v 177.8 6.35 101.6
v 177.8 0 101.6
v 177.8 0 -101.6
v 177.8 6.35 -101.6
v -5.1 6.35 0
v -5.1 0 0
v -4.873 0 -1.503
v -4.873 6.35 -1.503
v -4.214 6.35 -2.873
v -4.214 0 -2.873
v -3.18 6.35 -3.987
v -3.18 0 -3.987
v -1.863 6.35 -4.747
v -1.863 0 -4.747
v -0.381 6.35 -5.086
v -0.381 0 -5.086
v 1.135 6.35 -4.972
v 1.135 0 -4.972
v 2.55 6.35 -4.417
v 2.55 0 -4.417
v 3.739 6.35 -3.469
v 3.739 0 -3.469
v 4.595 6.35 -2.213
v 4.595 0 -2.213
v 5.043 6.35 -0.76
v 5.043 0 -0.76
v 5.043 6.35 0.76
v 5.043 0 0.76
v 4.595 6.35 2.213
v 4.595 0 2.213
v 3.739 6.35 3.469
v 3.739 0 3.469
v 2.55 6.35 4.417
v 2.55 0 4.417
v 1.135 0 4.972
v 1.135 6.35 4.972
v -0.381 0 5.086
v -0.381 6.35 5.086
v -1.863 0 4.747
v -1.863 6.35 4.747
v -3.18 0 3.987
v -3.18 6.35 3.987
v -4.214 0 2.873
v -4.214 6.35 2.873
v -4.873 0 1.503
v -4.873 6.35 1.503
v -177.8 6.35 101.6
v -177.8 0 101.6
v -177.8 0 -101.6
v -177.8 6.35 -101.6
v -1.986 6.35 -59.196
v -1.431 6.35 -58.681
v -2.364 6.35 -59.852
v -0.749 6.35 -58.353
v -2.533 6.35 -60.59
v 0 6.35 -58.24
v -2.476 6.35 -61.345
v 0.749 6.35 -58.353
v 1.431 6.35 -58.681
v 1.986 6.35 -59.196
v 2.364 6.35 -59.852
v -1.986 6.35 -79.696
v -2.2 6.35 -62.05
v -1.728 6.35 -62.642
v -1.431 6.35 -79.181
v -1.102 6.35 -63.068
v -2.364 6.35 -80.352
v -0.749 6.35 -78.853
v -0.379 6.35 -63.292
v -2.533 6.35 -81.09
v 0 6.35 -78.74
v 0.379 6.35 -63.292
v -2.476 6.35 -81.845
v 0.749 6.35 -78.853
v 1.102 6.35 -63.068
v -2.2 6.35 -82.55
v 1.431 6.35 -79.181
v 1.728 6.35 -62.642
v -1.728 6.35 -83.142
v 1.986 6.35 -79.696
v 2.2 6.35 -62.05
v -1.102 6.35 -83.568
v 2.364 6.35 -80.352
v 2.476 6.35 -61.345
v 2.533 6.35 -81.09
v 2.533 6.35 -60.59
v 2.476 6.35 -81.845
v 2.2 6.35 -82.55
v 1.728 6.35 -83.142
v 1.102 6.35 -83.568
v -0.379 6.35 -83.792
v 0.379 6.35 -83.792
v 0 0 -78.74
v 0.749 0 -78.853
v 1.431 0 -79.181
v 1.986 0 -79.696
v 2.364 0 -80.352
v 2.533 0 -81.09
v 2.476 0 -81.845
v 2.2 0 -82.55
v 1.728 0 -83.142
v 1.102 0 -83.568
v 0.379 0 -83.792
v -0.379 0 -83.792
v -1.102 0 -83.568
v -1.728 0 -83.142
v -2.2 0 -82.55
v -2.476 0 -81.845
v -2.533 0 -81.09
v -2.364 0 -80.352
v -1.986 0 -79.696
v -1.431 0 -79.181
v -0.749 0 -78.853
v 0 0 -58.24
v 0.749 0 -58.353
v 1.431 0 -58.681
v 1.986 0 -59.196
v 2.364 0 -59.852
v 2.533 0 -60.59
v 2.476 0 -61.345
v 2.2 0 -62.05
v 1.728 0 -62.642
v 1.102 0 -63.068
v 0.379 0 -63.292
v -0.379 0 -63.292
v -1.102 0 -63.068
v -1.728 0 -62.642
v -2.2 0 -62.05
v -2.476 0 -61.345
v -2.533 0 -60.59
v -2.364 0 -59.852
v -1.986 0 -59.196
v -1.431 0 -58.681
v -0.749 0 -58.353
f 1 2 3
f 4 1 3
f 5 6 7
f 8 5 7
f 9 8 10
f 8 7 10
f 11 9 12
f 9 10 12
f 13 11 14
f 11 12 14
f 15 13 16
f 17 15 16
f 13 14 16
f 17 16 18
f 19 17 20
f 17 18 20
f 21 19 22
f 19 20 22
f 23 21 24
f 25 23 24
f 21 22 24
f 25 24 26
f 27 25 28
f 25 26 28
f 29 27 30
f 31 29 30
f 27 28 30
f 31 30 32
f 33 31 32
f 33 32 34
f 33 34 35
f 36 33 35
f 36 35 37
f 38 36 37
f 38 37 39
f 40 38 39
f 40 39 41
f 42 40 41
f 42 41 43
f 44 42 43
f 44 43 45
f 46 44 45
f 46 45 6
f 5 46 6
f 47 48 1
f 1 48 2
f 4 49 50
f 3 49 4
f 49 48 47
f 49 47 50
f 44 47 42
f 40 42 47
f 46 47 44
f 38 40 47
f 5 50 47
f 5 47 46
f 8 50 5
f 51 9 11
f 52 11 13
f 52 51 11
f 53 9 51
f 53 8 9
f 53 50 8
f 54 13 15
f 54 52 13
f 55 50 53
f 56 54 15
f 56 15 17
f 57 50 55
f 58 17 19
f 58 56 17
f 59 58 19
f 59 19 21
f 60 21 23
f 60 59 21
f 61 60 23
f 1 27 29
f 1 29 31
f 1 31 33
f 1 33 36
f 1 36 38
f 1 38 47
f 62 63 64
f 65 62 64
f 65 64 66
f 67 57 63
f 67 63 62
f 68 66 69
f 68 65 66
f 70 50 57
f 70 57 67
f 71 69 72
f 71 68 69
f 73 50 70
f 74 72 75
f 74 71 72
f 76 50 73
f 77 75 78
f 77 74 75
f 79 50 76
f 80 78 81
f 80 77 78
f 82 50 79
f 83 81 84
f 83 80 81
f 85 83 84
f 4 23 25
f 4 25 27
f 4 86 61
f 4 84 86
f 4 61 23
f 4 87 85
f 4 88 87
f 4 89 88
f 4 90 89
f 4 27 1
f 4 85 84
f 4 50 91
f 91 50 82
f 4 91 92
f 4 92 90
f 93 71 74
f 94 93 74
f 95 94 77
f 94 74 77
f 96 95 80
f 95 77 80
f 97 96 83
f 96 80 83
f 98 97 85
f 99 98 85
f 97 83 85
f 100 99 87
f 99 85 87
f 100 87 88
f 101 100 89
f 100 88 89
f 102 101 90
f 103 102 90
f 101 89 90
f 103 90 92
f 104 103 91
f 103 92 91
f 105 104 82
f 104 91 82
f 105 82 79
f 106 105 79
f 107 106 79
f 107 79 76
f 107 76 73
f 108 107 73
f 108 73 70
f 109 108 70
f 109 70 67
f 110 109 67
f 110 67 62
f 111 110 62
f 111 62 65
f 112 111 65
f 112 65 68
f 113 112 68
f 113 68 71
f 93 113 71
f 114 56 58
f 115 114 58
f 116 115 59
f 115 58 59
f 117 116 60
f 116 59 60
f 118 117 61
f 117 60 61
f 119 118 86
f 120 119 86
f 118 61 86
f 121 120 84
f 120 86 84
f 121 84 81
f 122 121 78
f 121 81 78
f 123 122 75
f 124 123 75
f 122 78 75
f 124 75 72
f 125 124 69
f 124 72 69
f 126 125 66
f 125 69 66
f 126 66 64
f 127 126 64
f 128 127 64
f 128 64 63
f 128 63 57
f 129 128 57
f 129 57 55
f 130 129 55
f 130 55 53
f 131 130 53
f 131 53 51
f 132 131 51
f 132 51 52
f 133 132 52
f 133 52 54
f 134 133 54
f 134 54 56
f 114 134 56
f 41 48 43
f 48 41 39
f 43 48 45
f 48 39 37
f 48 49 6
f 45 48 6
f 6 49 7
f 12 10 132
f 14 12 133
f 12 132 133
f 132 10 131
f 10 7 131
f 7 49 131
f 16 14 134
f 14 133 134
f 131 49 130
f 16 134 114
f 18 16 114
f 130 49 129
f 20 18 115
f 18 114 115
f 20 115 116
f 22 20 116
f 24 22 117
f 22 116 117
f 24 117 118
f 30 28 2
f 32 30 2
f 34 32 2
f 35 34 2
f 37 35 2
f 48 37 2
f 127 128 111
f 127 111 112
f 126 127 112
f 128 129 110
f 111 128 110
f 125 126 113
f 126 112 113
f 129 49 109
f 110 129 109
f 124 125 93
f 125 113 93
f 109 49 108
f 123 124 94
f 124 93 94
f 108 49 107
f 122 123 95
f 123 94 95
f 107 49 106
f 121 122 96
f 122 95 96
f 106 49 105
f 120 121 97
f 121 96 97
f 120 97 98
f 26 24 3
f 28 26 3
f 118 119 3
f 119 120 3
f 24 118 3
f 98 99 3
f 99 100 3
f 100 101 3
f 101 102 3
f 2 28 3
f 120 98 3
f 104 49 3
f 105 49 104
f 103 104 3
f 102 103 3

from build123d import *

# Parameters (mm, degrees)
SKETCH2_W                         = 355.6
SKETCH2_H                         = 203.2
BOSS_EXTRUDE1_DEPTH               = 6.35
SKETCH3_R                         = 2.54
CUT_EXTRUDE1_DEPTH                = 205.879775722
TAP_DRILL_FOR_M12X1_75_TAP1_D     = 10.2
TAP_DRILL_FOR_M12X1_75_TAP1_DEPTH = 19.05
TAP_DRILL_FOR_M12X1_75_TAP1_TIP   = 3.064389157


with BuildPart() as part:
    # Sketch2 → Boss-Extrude1 (new body)
    with BuildSketch(Plane(origin=(0, 0, 0), x_dir=(1, 0, 0), z_dir=(0, 1, 0))):
        Rectangle(SKETCH2_W, SKETCH2_H)
    extrude(amount=BOSS_EXTRUDE1_DEPTH)

    # Sketch3 → Cut-Extrude1 (cut, through all)
    with BuildSketch(Plane(origin=(0, 6.35, 0), x_dir=(1, 0, 0), z_dir=(0, 1, 0))):
        with Locations(Location((0, 81.28, 0), (0, 0, 270))):
            Circle(SKETCH3_R)
        with Locations(Location((0, 60.779914, 0), (0, 0, 270))):
            Circle(SKETCH3_R)
    extrude(amount=-CUT_EXTRUDE1_DEPTH, mode=Mode.SUBTRACT)

    # Tap Drill for M12x1.75 Tap1
    with Locations(Plane(origin=(0, 6.35, 0), x_dir=(1, 0, 0), z_dir=(0, 1, 0))):
        with Locations((0, 0)):
            Hole(TAP_DRILL_FOR_M12X1_75_TAP1_D / 2, depth=TAP_DRILL_FOR_M12X1_75_TAP1_DEPTH)
            with Locations((0, 0, -(TAP_DRILL_FOR_M12X1_75_TAP1_DEPTH + TAP_DRILL_FOR_M12X1_75_TAP1_TIP / 2))):  # 118° drill point
                Cone(0, TAP_DRILL_FOR_M12X1_75_TAP1_D / 2, TAP_DRILL_FOR_M12X1_75_TAP1_TIP, mode=Mode.SUBTRACT)


solid = part.part
